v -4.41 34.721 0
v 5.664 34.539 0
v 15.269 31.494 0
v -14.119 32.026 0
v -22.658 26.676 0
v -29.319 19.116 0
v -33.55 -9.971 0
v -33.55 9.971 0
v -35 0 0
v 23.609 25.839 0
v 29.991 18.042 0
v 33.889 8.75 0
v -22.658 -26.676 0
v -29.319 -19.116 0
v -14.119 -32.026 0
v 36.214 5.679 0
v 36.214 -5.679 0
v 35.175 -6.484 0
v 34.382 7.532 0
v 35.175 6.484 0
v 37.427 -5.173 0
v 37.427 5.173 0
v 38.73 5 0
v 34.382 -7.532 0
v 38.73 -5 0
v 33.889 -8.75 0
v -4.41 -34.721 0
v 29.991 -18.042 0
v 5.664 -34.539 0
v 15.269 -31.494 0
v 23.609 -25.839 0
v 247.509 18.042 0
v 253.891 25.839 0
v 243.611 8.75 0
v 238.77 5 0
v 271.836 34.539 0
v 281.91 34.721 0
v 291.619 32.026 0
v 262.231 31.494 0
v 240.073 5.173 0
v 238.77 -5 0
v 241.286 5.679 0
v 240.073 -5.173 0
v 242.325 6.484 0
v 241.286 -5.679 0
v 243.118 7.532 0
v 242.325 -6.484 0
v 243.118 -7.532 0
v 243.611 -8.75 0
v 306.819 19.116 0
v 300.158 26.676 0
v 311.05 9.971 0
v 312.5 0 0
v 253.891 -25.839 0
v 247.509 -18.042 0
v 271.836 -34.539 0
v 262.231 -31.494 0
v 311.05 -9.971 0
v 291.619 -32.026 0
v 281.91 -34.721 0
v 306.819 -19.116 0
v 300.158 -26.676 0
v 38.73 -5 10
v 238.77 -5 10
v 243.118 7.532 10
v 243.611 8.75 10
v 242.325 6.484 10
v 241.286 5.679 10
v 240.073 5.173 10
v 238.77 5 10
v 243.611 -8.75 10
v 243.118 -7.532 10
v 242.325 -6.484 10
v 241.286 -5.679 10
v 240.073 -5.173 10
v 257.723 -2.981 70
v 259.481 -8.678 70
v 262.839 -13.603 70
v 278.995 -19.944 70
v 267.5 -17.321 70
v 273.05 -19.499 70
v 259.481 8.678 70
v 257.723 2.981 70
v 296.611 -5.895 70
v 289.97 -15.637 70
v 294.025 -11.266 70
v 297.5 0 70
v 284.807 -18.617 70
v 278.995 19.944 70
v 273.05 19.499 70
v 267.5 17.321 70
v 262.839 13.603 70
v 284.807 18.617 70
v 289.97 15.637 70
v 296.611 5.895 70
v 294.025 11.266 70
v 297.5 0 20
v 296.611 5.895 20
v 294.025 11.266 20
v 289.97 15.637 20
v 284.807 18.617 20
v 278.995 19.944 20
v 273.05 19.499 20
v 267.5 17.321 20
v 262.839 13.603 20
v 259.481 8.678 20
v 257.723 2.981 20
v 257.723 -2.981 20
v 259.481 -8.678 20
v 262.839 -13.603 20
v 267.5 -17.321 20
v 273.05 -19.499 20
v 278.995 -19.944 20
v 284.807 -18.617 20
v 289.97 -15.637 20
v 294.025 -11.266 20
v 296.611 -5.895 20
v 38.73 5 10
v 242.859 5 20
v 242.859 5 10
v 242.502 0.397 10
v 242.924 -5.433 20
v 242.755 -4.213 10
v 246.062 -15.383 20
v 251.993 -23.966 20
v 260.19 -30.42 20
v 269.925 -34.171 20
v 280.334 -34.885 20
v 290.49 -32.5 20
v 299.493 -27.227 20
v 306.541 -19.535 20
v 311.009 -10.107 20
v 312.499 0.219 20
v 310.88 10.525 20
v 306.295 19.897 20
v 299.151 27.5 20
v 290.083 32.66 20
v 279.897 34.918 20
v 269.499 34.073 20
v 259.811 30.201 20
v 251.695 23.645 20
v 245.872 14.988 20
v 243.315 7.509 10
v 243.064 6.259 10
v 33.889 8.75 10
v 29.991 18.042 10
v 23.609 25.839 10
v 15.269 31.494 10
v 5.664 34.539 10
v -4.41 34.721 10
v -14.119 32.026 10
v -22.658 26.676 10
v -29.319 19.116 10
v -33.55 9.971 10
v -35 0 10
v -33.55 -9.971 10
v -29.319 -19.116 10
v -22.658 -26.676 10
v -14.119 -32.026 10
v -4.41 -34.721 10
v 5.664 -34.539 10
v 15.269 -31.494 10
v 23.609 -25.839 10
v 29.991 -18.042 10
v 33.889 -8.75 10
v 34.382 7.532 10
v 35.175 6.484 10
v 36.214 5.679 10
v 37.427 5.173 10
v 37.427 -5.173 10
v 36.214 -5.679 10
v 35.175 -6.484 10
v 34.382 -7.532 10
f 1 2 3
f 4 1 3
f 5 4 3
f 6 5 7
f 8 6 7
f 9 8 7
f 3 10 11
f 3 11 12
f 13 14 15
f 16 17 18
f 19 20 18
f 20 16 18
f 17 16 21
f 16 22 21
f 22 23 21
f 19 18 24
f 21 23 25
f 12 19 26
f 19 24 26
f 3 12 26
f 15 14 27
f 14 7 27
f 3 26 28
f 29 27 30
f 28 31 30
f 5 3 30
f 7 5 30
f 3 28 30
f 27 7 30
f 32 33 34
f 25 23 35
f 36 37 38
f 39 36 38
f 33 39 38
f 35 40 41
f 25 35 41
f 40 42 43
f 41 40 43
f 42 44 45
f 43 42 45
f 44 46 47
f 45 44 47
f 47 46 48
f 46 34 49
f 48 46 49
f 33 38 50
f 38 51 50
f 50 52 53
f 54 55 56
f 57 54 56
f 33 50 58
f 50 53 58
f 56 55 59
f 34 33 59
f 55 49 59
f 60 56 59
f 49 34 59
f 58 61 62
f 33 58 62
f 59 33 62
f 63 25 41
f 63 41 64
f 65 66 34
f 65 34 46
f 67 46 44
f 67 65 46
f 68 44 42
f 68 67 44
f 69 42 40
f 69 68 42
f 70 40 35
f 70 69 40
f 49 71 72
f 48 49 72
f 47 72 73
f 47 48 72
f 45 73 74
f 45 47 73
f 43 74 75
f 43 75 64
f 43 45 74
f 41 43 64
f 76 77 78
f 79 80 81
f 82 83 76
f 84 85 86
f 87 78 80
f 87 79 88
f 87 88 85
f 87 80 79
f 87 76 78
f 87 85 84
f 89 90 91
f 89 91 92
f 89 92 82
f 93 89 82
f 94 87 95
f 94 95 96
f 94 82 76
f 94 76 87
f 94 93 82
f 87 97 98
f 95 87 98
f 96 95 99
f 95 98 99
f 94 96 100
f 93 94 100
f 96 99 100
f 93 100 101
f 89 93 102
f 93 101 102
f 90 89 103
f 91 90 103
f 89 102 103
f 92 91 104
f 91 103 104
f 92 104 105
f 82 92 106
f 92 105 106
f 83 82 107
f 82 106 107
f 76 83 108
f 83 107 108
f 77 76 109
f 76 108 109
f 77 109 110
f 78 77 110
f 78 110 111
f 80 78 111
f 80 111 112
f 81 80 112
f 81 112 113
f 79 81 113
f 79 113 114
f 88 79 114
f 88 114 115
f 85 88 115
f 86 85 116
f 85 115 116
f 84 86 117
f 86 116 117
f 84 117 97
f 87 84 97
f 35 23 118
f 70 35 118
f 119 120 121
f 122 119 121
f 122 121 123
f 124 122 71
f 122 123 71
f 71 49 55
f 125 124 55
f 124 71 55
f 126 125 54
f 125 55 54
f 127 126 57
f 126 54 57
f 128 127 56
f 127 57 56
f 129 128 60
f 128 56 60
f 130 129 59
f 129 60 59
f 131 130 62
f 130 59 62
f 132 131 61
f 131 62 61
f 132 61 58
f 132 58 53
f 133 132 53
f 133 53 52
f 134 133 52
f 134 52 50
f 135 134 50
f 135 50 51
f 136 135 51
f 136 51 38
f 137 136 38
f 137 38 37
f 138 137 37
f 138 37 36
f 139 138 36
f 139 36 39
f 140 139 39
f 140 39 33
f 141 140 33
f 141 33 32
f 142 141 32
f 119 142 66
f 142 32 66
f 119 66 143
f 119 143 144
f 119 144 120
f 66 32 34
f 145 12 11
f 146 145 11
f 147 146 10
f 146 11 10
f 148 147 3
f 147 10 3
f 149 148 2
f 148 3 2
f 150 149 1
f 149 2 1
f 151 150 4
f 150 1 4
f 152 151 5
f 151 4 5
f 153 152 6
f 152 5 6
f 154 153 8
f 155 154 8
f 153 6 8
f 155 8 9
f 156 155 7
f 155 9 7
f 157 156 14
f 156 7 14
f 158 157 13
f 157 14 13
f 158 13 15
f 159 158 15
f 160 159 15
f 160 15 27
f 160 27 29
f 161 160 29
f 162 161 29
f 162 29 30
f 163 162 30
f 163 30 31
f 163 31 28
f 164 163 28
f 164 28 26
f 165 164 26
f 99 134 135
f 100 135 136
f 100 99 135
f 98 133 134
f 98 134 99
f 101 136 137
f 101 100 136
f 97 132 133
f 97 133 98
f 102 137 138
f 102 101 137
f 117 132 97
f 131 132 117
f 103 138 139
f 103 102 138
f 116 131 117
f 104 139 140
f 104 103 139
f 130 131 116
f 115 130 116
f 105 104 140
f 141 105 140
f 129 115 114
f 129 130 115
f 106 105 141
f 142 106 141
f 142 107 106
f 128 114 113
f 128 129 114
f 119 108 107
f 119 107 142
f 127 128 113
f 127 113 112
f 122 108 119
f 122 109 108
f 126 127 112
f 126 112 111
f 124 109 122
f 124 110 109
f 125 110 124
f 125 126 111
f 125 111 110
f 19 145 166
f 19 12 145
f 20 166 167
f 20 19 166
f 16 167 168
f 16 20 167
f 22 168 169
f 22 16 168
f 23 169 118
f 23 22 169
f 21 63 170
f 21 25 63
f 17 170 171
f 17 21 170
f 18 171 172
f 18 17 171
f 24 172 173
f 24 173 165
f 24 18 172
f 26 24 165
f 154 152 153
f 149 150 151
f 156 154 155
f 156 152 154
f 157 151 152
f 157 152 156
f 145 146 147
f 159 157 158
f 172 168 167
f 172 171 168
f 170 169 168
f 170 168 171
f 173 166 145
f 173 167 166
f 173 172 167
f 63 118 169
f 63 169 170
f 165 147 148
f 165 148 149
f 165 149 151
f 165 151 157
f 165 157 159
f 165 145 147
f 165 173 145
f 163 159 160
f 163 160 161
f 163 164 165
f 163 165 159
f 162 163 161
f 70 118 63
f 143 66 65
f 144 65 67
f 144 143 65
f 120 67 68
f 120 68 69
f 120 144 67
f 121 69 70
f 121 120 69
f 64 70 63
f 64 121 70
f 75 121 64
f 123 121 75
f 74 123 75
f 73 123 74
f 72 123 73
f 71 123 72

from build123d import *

# Parameters (mm, degrees)
ESBO_O1_R                     = 35
RESSALTO_EXTRUS_O1_DEPTH      = 10
ESBO_O4_W                     = 10
ESBO_O4_H                     = 10
RESSALTO_EXTRUS_O2_DEPTH      = 277.5
FILETE3_R                     = 5
FILETE4_R                     = 5
RESSALTO_EXTRUS_O3_DEPTH      = 10
RESSALTO_EXTRUS_O3_DEPTH_BACK = 10
ESBO_O6_R                     = 35
FILETE5_R                     = 5
FILETE6_R                     = 5
ESBO_O7_R                     = 20
RESSALTO_EXTRUS_O4_DEPTH      = 50


with BuildPart() as part:
    # Esboço1 → Ressalto-extrusão1 (new body)
    with BuildSketch(Plane(origin=(0, 0, 0), x_dir=(0, 1, 0), z_dir=(0, 0, 1))):
        with Locations(Location((0, 0, 0), (0, 0, 270))):
            Circle(ESBO_O1_R)
    extrude(amount=RESSALTO_EXTRUS_O1_DEPTH)

    # Esboço4 → Ressalto-extrusão2 (add)
    with BuildSketch(Plane.YZ):
        with Locations((0, 5)):
            Rectangle(ESBO_O4_W, ESBO_O4_H)
    extrude(amount=RESSALTO_EXTRUS_O2_DEPTH)

    # Filete3
    filete3_edges = [part.edges().sort_by_distance(p)[0] for p in [
        (34.641016151, -5, 5),
    ]]
    fillet(filete3_edges, radius=FILETE3_R)

    # Filete4
    filete4_edges = [part.edges().sort_by_distance(p)[0] for p in [
        (34.641016151, 5, 5),
    ]]
    fillet(filete4_edges, radius=FILETE4_R)

    # Esboço6 → Ressalto-extrusão3 (add, two sides: drawn at the far end of the back side and taken through both)
    with BuildSketch(Plane.XY.offset(10).offset(-RESSALTO_EXTRUS_O3_DEPTH_BACK)):
        with Locations(Location((277.5, 0, 0), (0, 0, 171.786789298))):
            Circle(ESBO_O6_R)
    extrude(amount=RESSALTO_EXTRUS_O3_DEPTH + RESSALTO_EXTRUS_O3_DEPTH_BACK)

    # Filete5
    filete5_edges = [part.edges().sort_by_distance(p)[0] for p in [
        (242.858983849, -5, 5),
    ]]
    fillet(filete5_edges, radius=FILETE5_R)

    # Filete6
    # the kernel refuses this fillet: 5 mm, written as the material it adds along each edge
    with BuildSketch(Plane(origin=(242.858983849, 5, 10), x_dir=(0.1967224418008006, 0.9804592193925918, 0), z_dir=(0, 0, -1))) as filete6_piece_1:
        with BuildLine():
            CenterArc((4.097933971, -4.992530838), FILETE6_R, 93.132150742, 75.522487814)
            Line((-0.804362126, -4.008918629), (0, 0))
            ThreePointArc((0, 0), (1.912369187, -0.052284136), (3.824738373, 0))
        make_face()
    extrude(amount=10)

    # Esboço7 → Ressalto-extrusão4 (add)
    with BuildSketch(Plane.XY.offset(20)):
        with Locations((277.5, 0)):
            Circle(ESBO_O7_R)
    extrude(amount=RESSALTO_EXTRUS_O4_DEPTH)


solid = part.part
